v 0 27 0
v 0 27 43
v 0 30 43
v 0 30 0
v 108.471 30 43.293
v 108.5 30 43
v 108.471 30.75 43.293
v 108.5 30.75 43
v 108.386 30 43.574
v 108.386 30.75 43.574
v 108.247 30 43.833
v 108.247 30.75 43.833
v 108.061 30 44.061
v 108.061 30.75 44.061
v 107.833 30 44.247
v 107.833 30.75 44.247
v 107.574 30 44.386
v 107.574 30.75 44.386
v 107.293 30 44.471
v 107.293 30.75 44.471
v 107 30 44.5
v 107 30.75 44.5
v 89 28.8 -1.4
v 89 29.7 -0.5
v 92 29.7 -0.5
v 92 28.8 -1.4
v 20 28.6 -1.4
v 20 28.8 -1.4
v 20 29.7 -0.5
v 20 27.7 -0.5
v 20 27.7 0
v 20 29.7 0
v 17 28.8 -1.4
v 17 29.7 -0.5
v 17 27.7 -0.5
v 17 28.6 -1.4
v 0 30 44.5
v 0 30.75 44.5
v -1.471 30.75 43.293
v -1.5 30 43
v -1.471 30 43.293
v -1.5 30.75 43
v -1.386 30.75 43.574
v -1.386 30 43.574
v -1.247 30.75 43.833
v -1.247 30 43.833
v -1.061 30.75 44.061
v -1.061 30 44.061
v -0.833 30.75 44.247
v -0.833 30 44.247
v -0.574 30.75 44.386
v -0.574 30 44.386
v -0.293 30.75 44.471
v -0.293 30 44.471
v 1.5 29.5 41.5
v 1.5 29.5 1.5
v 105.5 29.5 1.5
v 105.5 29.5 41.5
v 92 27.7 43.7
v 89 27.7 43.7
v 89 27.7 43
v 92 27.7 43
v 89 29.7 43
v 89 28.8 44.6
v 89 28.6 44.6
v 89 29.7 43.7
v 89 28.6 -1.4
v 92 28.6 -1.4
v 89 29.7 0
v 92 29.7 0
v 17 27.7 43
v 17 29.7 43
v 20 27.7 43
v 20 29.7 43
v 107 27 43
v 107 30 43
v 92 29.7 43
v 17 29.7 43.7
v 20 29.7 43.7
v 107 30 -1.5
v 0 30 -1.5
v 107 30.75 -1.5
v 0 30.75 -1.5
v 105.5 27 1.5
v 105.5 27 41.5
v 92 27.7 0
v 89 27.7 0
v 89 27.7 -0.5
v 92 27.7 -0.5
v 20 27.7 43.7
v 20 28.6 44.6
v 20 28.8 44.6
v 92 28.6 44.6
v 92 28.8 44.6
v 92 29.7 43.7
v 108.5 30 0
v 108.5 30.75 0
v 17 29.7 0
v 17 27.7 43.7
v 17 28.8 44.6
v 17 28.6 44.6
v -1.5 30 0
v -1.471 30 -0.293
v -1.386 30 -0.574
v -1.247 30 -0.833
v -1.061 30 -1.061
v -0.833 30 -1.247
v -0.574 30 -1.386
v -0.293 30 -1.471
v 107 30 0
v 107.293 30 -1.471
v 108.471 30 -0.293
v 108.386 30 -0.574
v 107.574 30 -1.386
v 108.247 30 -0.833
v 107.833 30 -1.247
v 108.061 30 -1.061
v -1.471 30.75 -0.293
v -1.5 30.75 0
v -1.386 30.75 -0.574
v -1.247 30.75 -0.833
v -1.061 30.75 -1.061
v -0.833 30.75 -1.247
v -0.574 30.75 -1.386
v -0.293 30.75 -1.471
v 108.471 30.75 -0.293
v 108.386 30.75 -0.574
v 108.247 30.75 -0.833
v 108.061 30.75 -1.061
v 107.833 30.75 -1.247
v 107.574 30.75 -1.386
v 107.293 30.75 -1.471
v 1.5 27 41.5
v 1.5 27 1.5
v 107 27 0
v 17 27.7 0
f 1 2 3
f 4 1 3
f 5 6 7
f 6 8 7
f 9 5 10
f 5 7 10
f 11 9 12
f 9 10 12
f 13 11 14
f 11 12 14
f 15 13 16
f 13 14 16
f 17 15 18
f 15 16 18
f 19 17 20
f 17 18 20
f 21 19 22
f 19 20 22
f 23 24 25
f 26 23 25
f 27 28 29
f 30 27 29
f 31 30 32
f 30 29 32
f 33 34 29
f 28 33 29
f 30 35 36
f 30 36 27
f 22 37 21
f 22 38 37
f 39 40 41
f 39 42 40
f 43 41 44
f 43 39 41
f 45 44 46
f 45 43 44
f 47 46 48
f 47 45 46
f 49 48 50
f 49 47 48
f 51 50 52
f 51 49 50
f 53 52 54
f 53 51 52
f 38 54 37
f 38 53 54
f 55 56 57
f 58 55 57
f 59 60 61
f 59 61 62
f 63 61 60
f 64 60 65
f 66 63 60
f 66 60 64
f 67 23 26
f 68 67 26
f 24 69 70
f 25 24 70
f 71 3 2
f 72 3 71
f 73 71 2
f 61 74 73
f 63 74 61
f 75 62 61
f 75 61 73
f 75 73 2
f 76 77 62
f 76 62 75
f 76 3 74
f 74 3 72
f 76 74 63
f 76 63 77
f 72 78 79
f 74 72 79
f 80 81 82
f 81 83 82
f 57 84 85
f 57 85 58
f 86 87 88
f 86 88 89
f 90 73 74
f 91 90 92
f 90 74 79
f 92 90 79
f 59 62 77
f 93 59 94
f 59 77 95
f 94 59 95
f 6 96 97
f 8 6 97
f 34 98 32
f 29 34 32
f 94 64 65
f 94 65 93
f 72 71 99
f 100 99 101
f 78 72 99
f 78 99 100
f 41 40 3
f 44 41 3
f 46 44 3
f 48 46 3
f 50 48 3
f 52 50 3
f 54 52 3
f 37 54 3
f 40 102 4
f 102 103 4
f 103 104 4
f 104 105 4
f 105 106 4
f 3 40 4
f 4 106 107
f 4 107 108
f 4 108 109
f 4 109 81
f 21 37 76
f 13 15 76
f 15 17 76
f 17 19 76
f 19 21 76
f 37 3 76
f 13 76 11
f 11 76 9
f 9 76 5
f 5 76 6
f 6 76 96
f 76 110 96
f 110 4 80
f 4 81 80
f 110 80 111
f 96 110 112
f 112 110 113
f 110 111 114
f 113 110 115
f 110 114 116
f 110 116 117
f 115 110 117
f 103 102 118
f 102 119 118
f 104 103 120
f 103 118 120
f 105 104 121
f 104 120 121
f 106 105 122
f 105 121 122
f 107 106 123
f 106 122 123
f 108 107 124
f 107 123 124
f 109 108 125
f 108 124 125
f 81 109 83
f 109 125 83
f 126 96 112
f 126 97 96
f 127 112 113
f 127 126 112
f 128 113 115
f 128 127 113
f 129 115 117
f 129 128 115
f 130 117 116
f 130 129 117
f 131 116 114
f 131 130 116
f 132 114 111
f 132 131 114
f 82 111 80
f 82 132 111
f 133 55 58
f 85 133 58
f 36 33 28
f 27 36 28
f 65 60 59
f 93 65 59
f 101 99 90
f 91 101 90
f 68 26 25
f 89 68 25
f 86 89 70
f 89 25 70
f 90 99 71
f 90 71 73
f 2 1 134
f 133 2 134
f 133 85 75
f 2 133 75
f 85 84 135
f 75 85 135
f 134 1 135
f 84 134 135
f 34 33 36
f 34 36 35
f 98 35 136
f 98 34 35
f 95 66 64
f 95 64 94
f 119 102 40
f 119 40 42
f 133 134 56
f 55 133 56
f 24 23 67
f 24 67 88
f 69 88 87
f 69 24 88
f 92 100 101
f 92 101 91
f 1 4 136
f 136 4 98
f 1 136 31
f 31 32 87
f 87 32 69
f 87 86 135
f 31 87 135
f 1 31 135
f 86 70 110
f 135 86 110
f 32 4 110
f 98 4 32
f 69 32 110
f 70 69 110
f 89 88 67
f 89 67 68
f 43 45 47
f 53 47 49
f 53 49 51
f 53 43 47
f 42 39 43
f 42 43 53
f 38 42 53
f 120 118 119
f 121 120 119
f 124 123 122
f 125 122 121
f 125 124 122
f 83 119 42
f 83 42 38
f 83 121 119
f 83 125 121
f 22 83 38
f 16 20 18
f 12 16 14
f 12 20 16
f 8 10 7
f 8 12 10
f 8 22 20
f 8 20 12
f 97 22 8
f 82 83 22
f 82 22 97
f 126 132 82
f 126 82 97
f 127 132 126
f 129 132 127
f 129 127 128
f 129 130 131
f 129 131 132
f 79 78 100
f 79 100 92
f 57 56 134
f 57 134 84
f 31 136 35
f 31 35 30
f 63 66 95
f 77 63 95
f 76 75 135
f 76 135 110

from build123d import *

# Parameters (mm, degrees)
BOX030_W                   = 104
BOX030_H                   = 2.5
BOX030_DEPTH               = 40
BOX029_W                   = 107
BOX029_H                   = 3
BOX029_DEPTH               = 43
BOX028_W                   = 3
BOX028_H                   = 46
BOX028_DEPTH               = 2
CHAMFER003_SIZE            = 0.9
CHAMFER003_PLACEMENT_ANGLE = 90
BOX027_W                   = 3
BOX027_H                   = 46
BOX027_DEPTH               = 2
CHAMFER002_SIZE            = 0.9
CHAMFER002_PLACEMENT_ANGLE = 90
BOX031_W                   = 110
BOX031_H                   = 0.75
BOX031_DEPTH               = 46
FILLET_R                   = 1.5


with BuildPart() as cubo030:
    # Box030 → Box030 (new body)
    with BuildSketch(Plane(origin=(1.5, 27, 1.5), x_dir=(1, 0, 0), z_dir=(0, 0, 1))):
        with Locations((52, 1.25)):
            Rectangle(BOX030_W, BOX030_H)
    extrude(amount=BOX030_DEPTH)


with BuildPart() as cubo029:
    # Box029 → Box029 (new body)
    with BuildSketch(Plane(origin=(0, 27, 0), x_dir=(1, 0, 0), z_dir=(0, 0, 1))):
        with Locations((53.5, 1.5)):
            Rectangle(BOX029_W, BOX029_H)
    extrude(amount=BOX029_DEPTH)


with BuildPart() as chamfer003:
    # Box028 → Box028 (new body)
    with BuildSketch(Plane(origin=(5, -1, -6), x_dir=(1, 0, 0), z_dir=(0, 0, 1))):
        with Locations((1.5, 23)):
            Rectangle(BOX028_W, BOX028_H)
    extrude(amount=BOX028_DEPTH)

    # Chamfer003
    chamfer003_edges = [chamfer003.edges().sort_by_distance(p)[0] for p in [
        (6.5, -1, -6),
        (6.5, -1, -4),
        (6.5, 45, -6),
        (6.5, 45, -4),
    ]]
    chamfer(chamfer003_edges, length=CHAMFER003_SIZE)


with BuildPart() as chamfer003_1:
    # Chamfer003 placement: moved
    add(chamfer003.part.moved(Location((84, 23.7, -0.4))).rotate(Axis((84, 23.7, -0.4), (1, 0, 0)), CHAMFER003_PLACEMENT_ANGLE))


with BuildPart() as cut004:
    # Box027 → Box027 (new body)
    with BuildSketch(Plane(origin=(5, -1, -6), x_dir=(1, 0, 0), z_dir=(0, 0, 1))):
        with Locations((1.5, 23)):
            Rectangle(BOX027_W, BOX027_H)
    extrude(amount=BOX027_DEPTH)

    # Chamfer002
    chamfer002_edges = [cut004.edges().sort_by_distance(p)[0] for p in [
        (6.5, -1, -6),
        (6.5, -1, -4),
        (6.5, 45, -6),
        (6.5, 45, -4),
    ]]
    chamfer(chamfer002_edges, length=CHAMFER002_SIZE)


with BuildPart() as cut004_1:
    # Chamfer002 placement: moved
    add(cut004.part.moved(Location((12, 23.7, -0.4))).rotate(Axis((12, 23.7, -0.4), (1, 0, 0)), CHAMFER002_PLACEMENT_ANGLE))

    # Fusion001: union Chamfer003
    add(chamfer003_1.part)

    # Fusion002: union Cubo029
    add(cubo029.part)

    # Cut004: cut Cubo030
    add(cubo030.part, mode=Mode.SUBTRACT)


with BuildPart() as tapa:
    # Box031 → Box031 (new body)
    with BuildSketch(Plane(origin=(-1.5, 30, -1.5), x_dir=(1, 0, 0), z_dir=(0, 0, 1))):
        with Locations((55, 0.375)):
            Rectangle(BOX031_W, BOX031_H)
    extrude(amount=BOX031_DEPTH)

    # Fillet
    fillet_edges = [tapa.edges().sort_by_distance(p)[0] for p in [
        (-1.5, 30.375, 44.5),
        (-1.5, 30.375, -1.5),
        (108.5, 30.375, 44.5),
        (108.5, 30.375, -1.5),
    ]]
    fillet(fillet_edges, radius=FILLET_R)

    # Fusion003: union Cut004
    add(cut004_1.part)


solid = tapa.part
